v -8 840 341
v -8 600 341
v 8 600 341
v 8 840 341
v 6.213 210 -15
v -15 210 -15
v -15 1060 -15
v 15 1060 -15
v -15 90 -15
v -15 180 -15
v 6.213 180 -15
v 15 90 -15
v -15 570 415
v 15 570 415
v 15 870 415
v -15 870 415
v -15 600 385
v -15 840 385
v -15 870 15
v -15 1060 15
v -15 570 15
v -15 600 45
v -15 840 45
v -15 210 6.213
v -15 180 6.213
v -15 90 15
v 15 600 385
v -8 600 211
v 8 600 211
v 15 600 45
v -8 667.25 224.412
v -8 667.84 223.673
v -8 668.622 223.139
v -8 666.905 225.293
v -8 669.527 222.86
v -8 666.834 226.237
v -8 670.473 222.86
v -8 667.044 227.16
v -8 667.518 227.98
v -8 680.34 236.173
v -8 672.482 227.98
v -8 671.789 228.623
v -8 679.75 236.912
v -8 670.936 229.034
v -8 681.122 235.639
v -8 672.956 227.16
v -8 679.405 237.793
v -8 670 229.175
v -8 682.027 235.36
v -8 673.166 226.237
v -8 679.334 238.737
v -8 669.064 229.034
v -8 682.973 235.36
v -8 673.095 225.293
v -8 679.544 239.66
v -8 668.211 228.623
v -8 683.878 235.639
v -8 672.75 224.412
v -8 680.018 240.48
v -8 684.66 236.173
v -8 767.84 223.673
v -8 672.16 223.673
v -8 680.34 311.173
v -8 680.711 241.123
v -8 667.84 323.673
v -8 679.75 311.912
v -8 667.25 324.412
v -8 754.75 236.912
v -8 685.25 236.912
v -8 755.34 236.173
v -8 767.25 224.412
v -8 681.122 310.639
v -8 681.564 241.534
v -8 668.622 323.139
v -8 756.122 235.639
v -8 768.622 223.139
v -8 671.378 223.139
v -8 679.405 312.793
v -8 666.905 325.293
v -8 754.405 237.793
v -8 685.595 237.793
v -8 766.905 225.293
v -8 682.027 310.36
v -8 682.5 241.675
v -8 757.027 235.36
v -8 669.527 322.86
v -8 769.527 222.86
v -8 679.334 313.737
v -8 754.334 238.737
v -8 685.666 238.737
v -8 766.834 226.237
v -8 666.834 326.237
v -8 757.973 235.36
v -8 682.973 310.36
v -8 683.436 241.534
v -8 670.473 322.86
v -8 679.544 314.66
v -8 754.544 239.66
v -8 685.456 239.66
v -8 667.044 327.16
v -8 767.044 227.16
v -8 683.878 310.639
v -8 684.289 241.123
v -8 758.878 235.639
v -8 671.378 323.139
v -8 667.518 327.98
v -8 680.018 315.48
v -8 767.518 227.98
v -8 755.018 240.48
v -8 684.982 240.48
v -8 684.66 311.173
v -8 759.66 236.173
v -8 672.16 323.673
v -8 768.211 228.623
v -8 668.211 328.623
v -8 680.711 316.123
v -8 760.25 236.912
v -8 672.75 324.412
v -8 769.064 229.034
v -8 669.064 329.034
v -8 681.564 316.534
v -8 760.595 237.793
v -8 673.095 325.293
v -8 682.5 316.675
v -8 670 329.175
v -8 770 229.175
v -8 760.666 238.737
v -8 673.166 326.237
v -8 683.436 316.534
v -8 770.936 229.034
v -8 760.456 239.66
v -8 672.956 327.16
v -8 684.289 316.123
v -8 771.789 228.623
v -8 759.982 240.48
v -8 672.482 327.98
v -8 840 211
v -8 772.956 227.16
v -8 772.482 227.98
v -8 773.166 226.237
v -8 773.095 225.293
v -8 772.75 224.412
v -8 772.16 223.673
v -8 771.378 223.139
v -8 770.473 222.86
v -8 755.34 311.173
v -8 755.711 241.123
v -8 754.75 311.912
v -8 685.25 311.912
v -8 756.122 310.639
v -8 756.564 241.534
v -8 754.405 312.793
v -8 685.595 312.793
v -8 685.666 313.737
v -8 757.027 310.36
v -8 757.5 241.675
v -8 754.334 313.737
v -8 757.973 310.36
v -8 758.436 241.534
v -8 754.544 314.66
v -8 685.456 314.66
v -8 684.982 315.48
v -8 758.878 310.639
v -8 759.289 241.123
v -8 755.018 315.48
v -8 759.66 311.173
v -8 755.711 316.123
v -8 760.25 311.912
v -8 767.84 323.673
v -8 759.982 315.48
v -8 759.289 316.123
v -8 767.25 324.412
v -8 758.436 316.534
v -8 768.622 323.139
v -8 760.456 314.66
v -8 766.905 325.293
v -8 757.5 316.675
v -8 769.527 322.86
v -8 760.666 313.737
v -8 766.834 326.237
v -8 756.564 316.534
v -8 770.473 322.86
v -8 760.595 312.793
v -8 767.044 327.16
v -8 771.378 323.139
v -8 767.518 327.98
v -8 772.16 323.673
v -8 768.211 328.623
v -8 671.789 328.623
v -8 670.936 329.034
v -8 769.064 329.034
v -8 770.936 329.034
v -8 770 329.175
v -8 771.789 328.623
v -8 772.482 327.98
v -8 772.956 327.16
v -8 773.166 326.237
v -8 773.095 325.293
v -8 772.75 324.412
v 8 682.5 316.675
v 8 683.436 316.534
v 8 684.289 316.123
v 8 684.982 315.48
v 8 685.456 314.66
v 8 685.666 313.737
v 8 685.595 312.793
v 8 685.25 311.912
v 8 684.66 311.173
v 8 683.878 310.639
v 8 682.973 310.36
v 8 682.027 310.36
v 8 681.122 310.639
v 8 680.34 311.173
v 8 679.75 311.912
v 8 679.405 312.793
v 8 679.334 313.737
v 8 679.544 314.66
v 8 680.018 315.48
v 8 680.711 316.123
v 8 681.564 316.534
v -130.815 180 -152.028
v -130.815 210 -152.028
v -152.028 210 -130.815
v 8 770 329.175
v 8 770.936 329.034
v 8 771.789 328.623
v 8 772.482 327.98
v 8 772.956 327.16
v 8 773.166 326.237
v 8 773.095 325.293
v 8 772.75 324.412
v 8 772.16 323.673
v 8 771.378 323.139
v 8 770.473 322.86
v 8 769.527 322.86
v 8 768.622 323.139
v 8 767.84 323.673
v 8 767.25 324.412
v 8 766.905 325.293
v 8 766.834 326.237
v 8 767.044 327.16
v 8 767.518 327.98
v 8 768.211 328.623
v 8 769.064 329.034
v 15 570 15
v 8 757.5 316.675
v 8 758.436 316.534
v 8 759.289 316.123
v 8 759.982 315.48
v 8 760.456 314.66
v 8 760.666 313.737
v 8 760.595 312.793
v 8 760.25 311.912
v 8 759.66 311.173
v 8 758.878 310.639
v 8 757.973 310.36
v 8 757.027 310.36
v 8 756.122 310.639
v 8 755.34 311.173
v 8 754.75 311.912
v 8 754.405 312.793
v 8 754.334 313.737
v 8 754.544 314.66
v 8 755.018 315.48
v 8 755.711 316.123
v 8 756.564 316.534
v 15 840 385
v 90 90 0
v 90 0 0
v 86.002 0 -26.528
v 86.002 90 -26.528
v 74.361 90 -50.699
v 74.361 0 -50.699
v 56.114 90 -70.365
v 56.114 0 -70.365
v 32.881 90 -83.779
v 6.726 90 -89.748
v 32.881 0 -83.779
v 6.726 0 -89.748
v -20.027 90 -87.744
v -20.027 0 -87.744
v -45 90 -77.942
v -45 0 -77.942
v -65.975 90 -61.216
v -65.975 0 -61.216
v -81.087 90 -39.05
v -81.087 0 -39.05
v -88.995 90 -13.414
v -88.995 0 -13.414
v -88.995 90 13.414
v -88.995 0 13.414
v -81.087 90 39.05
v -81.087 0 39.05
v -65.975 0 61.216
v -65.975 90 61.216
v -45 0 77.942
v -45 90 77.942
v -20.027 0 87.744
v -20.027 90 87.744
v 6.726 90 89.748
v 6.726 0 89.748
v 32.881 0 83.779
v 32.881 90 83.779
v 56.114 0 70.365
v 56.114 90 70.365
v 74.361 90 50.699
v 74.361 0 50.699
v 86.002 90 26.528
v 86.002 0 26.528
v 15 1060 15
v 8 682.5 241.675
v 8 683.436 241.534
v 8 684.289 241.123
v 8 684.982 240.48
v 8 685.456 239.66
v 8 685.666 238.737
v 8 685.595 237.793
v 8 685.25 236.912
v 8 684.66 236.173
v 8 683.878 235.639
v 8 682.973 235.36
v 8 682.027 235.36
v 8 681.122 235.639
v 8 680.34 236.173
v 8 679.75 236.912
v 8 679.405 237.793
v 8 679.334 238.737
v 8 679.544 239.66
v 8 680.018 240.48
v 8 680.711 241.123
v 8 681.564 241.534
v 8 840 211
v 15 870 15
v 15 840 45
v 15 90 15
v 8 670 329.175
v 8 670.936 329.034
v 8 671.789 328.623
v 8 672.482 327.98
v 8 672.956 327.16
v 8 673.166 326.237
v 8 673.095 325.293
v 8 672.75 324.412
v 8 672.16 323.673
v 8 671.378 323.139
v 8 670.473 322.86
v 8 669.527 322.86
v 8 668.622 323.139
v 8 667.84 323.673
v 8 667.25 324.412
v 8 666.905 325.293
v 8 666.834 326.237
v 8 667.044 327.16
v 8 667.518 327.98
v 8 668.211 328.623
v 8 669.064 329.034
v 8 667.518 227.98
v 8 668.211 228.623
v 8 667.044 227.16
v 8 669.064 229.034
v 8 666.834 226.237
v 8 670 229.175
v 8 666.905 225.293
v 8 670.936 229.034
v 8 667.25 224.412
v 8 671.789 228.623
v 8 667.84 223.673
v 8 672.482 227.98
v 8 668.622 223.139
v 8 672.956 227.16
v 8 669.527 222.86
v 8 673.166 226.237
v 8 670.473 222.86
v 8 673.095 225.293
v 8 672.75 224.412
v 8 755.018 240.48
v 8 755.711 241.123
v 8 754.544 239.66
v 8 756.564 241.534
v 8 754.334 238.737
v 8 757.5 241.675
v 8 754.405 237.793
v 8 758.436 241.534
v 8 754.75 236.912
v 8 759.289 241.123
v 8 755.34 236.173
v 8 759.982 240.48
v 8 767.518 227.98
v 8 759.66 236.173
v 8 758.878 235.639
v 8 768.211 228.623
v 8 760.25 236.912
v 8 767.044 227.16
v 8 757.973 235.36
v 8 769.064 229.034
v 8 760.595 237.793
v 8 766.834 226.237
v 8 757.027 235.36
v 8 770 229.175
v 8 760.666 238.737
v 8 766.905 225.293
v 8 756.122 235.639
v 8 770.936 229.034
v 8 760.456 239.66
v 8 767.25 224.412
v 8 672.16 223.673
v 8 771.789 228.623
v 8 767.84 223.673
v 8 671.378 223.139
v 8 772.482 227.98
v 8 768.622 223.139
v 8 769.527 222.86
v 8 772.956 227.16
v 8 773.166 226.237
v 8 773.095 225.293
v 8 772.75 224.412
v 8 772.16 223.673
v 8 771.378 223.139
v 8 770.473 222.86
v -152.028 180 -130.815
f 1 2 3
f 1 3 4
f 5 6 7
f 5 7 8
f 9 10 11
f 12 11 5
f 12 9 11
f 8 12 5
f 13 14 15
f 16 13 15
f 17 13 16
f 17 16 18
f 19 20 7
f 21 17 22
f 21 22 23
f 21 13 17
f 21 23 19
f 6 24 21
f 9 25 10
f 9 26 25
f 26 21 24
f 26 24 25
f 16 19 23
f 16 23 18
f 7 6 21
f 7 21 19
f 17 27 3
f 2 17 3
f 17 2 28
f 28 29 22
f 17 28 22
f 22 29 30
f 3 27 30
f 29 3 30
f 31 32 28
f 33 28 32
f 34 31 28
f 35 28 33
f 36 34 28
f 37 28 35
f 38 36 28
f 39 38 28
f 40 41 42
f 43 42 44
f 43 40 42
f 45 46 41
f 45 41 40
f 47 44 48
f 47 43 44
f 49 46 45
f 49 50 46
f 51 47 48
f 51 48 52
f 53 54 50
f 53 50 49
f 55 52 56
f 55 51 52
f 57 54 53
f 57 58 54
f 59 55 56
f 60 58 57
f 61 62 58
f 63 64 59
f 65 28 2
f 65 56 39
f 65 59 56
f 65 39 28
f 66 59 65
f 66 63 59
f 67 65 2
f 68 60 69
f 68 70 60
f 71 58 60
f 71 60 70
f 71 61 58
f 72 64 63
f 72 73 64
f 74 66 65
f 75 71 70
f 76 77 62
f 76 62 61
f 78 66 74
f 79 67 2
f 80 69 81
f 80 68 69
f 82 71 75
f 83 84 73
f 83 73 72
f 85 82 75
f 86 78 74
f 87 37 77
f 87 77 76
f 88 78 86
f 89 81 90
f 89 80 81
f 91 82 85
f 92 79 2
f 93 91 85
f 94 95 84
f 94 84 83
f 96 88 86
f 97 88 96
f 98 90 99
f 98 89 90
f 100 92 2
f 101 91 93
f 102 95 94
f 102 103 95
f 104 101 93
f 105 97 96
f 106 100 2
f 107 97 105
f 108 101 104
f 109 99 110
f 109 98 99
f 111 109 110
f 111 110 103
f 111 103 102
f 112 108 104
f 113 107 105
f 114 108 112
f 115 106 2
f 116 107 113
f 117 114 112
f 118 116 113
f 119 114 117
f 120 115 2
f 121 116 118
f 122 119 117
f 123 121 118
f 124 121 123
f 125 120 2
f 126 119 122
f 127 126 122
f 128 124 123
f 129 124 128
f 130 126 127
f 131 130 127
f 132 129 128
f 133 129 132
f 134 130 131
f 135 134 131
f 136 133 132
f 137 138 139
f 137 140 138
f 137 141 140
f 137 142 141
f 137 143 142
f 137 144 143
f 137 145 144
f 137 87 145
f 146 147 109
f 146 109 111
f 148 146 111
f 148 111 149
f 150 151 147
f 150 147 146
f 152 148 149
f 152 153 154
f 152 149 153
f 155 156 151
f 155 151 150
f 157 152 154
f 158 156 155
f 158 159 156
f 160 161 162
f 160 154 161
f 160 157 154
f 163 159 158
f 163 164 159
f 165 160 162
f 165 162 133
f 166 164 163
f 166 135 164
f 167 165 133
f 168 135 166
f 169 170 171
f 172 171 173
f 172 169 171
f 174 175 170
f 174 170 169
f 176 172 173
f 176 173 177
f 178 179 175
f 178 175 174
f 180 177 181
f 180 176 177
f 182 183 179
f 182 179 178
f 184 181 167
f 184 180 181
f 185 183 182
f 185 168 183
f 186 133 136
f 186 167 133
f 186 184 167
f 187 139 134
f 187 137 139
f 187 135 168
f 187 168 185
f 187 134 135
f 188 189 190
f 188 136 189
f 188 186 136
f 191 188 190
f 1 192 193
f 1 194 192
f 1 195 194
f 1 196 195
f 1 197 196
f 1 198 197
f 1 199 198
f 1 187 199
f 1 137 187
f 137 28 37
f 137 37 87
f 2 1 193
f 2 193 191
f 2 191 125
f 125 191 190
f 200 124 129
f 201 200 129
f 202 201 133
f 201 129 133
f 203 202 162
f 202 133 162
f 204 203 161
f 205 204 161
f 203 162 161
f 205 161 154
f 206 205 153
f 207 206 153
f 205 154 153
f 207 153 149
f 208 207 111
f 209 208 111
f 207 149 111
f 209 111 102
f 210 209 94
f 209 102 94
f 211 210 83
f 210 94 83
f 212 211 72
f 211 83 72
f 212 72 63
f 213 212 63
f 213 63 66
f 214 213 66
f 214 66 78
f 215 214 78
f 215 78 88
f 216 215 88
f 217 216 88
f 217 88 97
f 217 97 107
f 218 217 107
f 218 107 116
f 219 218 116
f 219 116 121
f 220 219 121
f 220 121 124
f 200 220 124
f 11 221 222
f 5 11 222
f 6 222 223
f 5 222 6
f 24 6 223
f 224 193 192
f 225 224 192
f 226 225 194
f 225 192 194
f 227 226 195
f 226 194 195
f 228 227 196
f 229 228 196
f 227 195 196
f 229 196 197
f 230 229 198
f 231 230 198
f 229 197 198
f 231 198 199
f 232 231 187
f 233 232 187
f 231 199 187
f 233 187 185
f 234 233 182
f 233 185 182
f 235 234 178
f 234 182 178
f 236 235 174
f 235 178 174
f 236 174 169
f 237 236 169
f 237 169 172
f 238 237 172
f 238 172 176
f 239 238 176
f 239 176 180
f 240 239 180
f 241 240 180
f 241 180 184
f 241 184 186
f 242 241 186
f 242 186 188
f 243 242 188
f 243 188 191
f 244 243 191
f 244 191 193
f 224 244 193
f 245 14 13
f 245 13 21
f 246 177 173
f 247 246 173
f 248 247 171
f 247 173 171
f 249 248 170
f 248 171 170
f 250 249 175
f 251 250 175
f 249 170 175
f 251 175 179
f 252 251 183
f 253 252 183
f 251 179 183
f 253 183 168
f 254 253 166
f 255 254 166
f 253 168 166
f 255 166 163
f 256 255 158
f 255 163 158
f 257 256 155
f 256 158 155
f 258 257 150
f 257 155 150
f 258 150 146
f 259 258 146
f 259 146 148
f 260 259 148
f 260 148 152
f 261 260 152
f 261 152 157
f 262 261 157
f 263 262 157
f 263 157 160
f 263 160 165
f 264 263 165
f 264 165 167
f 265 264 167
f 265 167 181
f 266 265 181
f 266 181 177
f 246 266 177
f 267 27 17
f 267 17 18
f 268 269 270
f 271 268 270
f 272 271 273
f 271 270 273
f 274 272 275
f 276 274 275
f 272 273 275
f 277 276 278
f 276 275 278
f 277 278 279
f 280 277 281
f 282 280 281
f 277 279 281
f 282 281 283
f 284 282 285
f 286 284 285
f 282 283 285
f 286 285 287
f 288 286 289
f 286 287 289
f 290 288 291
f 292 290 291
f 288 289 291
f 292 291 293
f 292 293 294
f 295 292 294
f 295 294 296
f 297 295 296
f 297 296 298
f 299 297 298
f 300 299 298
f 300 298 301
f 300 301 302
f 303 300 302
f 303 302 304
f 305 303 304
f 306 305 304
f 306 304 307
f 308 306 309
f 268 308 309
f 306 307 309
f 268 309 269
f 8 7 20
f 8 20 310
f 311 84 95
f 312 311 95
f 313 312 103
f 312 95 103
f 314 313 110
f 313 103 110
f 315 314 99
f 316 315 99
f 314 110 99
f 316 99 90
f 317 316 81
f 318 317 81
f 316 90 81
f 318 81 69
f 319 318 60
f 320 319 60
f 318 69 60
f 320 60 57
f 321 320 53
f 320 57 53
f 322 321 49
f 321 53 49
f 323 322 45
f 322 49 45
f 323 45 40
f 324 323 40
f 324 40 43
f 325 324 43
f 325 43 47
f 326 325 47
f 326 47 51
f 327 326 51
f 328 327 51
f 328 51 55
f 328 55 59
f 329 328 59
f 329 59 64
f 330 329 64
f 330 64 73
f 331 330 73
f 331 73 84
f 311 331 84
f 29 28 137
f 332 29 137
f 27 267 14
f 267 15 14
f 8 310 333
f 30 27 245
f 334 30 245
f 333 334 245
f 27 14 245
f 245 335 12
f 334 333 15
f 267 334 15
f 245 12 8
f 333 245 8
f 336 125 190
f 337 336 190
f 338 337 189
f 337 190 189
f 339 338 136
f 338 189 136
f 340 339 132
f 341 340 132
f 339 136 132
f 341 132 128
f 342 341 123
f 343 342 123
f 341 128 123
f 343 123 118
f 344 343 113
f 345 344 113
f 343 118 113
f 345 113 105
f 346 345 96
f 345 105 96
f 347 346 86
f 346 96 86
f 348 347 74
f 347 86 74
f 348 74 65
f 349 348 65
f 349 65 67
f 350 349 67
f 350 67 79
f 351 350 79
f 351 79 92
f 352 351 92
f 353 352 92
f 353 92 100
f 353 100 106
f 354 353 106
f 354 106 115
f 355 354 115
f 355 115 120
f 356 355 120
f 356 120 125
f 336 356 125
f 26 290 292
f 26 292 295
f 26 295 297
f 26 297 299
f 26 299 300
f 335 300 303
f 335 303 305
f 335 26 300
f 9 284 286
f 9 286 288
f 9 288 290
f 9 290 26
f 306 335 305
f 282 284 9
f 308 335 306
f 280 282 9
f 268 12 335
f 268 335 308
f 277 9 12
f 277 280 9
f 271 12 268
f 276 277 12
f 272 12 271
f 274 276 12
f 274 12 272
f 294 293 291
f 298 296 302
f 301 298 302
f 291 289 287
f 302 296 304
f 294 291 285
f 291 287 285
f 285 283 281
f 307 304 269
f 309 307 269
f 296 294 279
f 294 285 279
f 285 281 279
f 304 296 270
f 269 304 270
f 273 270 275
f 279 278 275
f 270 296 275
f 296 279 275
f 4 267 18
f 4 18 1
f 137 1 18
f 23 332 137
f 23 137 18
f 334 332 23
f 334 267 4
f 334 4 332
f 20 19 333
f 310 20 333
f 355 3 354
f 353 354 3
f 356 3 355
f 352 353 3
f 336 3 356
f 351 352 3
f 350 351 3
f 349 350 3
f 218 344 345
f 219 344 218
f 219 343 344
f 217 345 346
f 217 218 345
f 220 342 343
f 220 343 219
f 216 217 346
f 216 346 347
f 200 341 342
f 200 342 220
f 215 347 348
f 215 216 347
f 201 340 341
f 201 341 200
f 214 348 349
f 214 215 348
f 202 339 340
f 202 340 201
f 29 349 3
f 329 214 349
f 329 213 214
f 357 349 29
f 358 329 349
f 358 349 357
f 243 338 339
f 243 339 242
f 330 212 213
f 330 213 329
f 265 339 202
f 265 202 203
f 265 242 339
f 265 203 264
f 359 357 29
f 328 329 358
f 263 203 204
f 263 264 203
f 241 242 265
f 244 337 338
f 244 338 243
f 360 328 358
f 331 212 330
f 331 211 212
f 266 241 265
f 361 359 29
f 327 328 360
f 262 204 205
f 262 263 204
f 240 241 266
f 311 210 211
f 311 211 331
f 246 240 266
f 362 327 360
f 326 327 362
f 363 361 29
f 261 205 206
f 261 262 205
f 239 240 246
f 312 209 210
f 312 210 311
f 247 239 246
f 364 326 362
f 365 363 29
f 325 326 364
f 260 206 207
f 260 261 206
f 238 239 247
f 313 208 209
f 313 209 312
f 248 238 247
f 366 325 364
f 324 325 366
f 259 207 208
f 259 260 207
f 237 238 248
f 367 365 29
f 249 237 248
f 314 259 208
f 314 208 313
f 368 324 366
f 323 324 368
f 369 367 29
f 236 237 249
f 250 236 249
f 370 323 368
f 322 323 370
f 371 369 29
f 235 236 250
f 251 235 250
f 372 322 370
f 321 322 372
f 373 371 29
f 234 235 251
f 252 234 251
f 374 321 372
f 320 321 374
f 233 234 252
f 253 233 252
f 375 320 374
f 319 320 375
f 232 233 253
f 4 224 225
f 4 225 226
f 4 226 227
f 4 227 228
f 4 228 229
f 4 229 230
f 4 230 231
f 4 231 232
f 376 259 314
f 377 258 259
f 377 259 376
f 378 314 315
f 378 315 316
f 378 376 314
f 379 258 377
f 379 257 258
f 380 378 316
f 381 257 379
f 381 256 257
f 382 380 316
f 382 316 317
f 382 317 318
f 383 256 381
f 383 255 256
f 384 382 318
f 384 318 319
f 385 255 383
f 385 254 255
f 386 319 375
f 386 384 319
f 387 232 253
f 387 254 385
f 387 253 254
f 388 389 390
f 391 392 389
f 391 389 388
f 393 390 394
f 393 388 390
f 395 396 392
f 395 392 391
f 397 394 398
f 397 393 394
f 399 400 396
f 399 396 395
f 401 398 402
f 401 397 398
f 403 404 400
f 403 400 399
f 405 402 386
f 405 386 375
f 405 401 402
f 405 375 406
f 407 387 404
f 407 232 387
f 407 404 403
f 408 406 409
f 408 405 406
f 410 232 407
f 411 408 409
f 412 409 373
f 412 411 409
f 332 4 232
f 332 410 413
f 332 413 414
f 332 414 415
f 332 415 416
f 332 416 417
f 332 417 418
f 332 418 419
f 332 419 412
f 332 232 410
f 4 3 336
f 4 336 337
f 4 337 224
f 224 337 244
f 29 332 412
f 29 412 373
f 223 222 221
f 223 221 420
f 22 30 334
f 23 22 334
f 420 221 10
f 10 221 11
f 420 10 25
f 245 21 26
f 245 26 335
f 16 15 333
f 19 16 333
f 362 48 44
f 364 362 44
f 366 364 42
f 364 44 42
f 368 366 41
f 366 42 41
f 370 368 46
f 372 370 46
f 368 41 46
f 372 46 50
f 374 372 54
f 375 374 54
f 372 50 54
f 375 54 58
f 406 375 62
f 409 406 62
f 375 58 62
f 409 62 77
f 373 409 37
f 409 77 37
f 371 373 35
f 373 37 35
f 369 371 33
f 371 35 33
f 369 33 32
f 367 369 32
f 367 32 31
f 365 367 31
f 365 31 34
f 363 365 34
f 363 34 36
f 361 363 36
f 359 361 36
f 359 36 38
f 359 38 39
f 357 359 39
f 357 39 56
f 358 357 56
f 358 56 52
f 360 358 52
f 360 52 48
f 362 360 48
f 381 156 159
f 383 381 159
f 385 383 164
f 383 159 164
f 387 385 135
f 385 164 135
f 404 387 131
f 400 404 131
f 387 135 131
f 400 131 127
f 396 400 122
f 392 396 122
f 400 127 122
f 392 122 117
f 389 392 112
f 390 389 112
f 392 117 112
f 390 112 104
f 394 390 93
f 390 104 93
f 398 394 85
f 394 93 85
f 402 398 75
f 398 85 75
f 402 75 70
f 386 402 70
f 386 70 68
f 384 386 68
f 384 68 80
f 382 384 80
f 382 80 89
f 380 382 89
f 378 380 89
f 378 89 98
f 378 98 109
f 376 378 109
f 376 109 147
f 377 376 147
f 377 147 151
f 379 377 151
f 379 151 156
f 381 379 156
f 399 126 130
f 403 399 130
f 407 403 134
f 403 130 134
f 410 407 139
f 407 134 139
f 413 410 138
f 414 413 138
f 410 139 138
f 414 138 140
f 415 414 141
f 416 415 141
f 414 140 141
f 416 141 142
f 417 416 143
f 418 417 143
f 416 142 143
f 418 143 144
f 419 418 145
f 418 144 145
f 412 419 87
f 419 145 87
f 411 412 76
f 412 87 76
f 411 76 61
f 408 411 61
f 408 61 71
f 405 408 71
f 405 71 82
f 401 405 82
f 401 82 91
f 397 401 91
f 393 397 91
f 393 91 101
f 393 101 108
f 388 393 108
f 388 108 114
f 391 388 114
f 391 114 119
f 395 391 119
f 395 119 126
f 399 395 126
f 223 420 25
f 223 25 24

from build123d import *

# Parameters (mm, degrees)
SKETCH_1_R          = 90
EXTRUDE_1_DEPTH     = 90
SKETCH_2_W          = 30
SKETCH_2_H          = 30
EXTRUDE_2_DEPTH     = 970
SKETCH_3_W          = 30
SKETCH_3_H          = 30
EXTRUDE_3_DEPTH     = 200
SKETCH_5_W          = 400
SKETCH_5_H          = 300
SKETCH_5_W_2        = 340
SKETCH_5_H_2        = 240
EXTRUDE_5_DEPTH     = 30
SKETCH_7_W          = 130
SKETCH_7_H          = 240
SKETCH_7_R          = 3.175
EXTRUDE_6_DEPTH     = 30
SKETCH_8_W          = 130
SKETCH_8_H          = 240
CUT_EXTRUDE_1_DEPTH = 7
SKETCH_9_W          = 130
SKETCH_9_H          = 240
CUT_EXTRUDE_2_DEPTH = 7


with BuildPart() as part:
    # 草圖1 → 填料-伸長1 (new body)
    with BuildSketch(Plane(origin=(0, 0, 0), x_dir=(1, 0, 0), z_dir=(0, 1, 0))):
        Circle(SKETCH_1_R)
    extrude(amount=EXTRUDE_1_DEPTH)

    # 草圖2 → 填料-伸長2 (add)
    with BuildSketch(Plane(origin=(0, 90, 0), x_dir=(1, 0, 0), z_dir=(0, 1, 0))):
        Rectangle(SKETCH_2_W, SKETCH_2_H)
    extrude(amount=EXTRUDE_2_DEPTH)

    # 草圖3 → 填料-伸長3 (add)
    with BuildSketch(Plane(origin=(0, 0, 0), x_dir=(-0.707106781, 0, 0.707106781), z_dir=(-0.707106781, 0, -0.707106781))):
        with Locations((0, 195)):
            Rectangle(SKETCH_3_W, SKETCH_3_H)
    extrude(amount=EXTRUDE_3_DEPTH)

    # 草圖5 → 填料-伸長5 (add)
    with BuildSketch(Plane(origin=(15, 0, 0), x_dir=(0, 0, -1), z_dir=(1, 0, 0))):
        with Locations((-215, 720)):
            Rectangle(SKETCH_5_W, SKETCH_5_H)
        with Locations((-215, 720)):
            Rectangle(SKETCH_5_W_2, SKETCH_5_H_2, mode=Mode.SUBTRACT)
    extrude(amount=-EXTRUDE_5_DEPTH)

    # 草圖7 → 填料-伸長6 (add)
    with BuildSketch(Plane.ZY.offset(15)):
        with Locations((276, 720)):
            Rectangle(SKETCH_7_W, SKETCH_7_H)
        with Locations((313.5, 757.5)):
            Circle(SKETCH_7_R, mode=Mode.SUBTRACT)
        with Locations((238.5, 757.5)):
            Circle(SKETCH_7_R, mode=Mode.SUBTRACT)
        with Locations((238.5, 682.5)):
            Circle(SKETCH_7_R, mode=Mode.SUBTRACT)
        with Locations((313.5, 682.5)):
            Circle(SKETCH_7_R, mode=Mode.SUBTRACT)
        with Locations((326, 770)):
            Circle(SKETCH_7_R, mode=Mode.SUBTRACT)
        with Locations((226, 770)):
            Circle(SKETCH_7_R, mode=Mode.SUBTRACT)
        with Locations((326, 670)):
            Circle(SKETCH_7_R, mode=Mode.SUBTRACT)
        with Locations((226, 670)):
            Circle(SKETCH_7_R, mode=Mode.SUBTRACT)
    extrude(amount=-EXTRUDE_6_DEPTH)

    # 草圖8 → 除料-伸長1 (cut)
    with BuildSketch(Plane.ZY.offset(15)):
        with Locations((276, 720)):
            Rectangle(SKETCH_8_W, SKETCH_8_H)
    extrude(amount=-CUT_EXTRUDE_1_DEPTH, mode=Mode.SUBTRACT)

    # 草圖9 → 除料-伸長2 (cut)
    with BuildSketch(Plane(origin=(15, 0, 0), x_dir=(0, 0, -1), z_dir=(1, 0, 0))):
        with Locations((-276, 720)):
            Rectangle(SKETCH_9_W, SKETCH_9_H)
    extrude(amount=-CUT_EXTRUDE_2_DEPTH, mode=Mode.SUBTRACT)


solid = part.part
